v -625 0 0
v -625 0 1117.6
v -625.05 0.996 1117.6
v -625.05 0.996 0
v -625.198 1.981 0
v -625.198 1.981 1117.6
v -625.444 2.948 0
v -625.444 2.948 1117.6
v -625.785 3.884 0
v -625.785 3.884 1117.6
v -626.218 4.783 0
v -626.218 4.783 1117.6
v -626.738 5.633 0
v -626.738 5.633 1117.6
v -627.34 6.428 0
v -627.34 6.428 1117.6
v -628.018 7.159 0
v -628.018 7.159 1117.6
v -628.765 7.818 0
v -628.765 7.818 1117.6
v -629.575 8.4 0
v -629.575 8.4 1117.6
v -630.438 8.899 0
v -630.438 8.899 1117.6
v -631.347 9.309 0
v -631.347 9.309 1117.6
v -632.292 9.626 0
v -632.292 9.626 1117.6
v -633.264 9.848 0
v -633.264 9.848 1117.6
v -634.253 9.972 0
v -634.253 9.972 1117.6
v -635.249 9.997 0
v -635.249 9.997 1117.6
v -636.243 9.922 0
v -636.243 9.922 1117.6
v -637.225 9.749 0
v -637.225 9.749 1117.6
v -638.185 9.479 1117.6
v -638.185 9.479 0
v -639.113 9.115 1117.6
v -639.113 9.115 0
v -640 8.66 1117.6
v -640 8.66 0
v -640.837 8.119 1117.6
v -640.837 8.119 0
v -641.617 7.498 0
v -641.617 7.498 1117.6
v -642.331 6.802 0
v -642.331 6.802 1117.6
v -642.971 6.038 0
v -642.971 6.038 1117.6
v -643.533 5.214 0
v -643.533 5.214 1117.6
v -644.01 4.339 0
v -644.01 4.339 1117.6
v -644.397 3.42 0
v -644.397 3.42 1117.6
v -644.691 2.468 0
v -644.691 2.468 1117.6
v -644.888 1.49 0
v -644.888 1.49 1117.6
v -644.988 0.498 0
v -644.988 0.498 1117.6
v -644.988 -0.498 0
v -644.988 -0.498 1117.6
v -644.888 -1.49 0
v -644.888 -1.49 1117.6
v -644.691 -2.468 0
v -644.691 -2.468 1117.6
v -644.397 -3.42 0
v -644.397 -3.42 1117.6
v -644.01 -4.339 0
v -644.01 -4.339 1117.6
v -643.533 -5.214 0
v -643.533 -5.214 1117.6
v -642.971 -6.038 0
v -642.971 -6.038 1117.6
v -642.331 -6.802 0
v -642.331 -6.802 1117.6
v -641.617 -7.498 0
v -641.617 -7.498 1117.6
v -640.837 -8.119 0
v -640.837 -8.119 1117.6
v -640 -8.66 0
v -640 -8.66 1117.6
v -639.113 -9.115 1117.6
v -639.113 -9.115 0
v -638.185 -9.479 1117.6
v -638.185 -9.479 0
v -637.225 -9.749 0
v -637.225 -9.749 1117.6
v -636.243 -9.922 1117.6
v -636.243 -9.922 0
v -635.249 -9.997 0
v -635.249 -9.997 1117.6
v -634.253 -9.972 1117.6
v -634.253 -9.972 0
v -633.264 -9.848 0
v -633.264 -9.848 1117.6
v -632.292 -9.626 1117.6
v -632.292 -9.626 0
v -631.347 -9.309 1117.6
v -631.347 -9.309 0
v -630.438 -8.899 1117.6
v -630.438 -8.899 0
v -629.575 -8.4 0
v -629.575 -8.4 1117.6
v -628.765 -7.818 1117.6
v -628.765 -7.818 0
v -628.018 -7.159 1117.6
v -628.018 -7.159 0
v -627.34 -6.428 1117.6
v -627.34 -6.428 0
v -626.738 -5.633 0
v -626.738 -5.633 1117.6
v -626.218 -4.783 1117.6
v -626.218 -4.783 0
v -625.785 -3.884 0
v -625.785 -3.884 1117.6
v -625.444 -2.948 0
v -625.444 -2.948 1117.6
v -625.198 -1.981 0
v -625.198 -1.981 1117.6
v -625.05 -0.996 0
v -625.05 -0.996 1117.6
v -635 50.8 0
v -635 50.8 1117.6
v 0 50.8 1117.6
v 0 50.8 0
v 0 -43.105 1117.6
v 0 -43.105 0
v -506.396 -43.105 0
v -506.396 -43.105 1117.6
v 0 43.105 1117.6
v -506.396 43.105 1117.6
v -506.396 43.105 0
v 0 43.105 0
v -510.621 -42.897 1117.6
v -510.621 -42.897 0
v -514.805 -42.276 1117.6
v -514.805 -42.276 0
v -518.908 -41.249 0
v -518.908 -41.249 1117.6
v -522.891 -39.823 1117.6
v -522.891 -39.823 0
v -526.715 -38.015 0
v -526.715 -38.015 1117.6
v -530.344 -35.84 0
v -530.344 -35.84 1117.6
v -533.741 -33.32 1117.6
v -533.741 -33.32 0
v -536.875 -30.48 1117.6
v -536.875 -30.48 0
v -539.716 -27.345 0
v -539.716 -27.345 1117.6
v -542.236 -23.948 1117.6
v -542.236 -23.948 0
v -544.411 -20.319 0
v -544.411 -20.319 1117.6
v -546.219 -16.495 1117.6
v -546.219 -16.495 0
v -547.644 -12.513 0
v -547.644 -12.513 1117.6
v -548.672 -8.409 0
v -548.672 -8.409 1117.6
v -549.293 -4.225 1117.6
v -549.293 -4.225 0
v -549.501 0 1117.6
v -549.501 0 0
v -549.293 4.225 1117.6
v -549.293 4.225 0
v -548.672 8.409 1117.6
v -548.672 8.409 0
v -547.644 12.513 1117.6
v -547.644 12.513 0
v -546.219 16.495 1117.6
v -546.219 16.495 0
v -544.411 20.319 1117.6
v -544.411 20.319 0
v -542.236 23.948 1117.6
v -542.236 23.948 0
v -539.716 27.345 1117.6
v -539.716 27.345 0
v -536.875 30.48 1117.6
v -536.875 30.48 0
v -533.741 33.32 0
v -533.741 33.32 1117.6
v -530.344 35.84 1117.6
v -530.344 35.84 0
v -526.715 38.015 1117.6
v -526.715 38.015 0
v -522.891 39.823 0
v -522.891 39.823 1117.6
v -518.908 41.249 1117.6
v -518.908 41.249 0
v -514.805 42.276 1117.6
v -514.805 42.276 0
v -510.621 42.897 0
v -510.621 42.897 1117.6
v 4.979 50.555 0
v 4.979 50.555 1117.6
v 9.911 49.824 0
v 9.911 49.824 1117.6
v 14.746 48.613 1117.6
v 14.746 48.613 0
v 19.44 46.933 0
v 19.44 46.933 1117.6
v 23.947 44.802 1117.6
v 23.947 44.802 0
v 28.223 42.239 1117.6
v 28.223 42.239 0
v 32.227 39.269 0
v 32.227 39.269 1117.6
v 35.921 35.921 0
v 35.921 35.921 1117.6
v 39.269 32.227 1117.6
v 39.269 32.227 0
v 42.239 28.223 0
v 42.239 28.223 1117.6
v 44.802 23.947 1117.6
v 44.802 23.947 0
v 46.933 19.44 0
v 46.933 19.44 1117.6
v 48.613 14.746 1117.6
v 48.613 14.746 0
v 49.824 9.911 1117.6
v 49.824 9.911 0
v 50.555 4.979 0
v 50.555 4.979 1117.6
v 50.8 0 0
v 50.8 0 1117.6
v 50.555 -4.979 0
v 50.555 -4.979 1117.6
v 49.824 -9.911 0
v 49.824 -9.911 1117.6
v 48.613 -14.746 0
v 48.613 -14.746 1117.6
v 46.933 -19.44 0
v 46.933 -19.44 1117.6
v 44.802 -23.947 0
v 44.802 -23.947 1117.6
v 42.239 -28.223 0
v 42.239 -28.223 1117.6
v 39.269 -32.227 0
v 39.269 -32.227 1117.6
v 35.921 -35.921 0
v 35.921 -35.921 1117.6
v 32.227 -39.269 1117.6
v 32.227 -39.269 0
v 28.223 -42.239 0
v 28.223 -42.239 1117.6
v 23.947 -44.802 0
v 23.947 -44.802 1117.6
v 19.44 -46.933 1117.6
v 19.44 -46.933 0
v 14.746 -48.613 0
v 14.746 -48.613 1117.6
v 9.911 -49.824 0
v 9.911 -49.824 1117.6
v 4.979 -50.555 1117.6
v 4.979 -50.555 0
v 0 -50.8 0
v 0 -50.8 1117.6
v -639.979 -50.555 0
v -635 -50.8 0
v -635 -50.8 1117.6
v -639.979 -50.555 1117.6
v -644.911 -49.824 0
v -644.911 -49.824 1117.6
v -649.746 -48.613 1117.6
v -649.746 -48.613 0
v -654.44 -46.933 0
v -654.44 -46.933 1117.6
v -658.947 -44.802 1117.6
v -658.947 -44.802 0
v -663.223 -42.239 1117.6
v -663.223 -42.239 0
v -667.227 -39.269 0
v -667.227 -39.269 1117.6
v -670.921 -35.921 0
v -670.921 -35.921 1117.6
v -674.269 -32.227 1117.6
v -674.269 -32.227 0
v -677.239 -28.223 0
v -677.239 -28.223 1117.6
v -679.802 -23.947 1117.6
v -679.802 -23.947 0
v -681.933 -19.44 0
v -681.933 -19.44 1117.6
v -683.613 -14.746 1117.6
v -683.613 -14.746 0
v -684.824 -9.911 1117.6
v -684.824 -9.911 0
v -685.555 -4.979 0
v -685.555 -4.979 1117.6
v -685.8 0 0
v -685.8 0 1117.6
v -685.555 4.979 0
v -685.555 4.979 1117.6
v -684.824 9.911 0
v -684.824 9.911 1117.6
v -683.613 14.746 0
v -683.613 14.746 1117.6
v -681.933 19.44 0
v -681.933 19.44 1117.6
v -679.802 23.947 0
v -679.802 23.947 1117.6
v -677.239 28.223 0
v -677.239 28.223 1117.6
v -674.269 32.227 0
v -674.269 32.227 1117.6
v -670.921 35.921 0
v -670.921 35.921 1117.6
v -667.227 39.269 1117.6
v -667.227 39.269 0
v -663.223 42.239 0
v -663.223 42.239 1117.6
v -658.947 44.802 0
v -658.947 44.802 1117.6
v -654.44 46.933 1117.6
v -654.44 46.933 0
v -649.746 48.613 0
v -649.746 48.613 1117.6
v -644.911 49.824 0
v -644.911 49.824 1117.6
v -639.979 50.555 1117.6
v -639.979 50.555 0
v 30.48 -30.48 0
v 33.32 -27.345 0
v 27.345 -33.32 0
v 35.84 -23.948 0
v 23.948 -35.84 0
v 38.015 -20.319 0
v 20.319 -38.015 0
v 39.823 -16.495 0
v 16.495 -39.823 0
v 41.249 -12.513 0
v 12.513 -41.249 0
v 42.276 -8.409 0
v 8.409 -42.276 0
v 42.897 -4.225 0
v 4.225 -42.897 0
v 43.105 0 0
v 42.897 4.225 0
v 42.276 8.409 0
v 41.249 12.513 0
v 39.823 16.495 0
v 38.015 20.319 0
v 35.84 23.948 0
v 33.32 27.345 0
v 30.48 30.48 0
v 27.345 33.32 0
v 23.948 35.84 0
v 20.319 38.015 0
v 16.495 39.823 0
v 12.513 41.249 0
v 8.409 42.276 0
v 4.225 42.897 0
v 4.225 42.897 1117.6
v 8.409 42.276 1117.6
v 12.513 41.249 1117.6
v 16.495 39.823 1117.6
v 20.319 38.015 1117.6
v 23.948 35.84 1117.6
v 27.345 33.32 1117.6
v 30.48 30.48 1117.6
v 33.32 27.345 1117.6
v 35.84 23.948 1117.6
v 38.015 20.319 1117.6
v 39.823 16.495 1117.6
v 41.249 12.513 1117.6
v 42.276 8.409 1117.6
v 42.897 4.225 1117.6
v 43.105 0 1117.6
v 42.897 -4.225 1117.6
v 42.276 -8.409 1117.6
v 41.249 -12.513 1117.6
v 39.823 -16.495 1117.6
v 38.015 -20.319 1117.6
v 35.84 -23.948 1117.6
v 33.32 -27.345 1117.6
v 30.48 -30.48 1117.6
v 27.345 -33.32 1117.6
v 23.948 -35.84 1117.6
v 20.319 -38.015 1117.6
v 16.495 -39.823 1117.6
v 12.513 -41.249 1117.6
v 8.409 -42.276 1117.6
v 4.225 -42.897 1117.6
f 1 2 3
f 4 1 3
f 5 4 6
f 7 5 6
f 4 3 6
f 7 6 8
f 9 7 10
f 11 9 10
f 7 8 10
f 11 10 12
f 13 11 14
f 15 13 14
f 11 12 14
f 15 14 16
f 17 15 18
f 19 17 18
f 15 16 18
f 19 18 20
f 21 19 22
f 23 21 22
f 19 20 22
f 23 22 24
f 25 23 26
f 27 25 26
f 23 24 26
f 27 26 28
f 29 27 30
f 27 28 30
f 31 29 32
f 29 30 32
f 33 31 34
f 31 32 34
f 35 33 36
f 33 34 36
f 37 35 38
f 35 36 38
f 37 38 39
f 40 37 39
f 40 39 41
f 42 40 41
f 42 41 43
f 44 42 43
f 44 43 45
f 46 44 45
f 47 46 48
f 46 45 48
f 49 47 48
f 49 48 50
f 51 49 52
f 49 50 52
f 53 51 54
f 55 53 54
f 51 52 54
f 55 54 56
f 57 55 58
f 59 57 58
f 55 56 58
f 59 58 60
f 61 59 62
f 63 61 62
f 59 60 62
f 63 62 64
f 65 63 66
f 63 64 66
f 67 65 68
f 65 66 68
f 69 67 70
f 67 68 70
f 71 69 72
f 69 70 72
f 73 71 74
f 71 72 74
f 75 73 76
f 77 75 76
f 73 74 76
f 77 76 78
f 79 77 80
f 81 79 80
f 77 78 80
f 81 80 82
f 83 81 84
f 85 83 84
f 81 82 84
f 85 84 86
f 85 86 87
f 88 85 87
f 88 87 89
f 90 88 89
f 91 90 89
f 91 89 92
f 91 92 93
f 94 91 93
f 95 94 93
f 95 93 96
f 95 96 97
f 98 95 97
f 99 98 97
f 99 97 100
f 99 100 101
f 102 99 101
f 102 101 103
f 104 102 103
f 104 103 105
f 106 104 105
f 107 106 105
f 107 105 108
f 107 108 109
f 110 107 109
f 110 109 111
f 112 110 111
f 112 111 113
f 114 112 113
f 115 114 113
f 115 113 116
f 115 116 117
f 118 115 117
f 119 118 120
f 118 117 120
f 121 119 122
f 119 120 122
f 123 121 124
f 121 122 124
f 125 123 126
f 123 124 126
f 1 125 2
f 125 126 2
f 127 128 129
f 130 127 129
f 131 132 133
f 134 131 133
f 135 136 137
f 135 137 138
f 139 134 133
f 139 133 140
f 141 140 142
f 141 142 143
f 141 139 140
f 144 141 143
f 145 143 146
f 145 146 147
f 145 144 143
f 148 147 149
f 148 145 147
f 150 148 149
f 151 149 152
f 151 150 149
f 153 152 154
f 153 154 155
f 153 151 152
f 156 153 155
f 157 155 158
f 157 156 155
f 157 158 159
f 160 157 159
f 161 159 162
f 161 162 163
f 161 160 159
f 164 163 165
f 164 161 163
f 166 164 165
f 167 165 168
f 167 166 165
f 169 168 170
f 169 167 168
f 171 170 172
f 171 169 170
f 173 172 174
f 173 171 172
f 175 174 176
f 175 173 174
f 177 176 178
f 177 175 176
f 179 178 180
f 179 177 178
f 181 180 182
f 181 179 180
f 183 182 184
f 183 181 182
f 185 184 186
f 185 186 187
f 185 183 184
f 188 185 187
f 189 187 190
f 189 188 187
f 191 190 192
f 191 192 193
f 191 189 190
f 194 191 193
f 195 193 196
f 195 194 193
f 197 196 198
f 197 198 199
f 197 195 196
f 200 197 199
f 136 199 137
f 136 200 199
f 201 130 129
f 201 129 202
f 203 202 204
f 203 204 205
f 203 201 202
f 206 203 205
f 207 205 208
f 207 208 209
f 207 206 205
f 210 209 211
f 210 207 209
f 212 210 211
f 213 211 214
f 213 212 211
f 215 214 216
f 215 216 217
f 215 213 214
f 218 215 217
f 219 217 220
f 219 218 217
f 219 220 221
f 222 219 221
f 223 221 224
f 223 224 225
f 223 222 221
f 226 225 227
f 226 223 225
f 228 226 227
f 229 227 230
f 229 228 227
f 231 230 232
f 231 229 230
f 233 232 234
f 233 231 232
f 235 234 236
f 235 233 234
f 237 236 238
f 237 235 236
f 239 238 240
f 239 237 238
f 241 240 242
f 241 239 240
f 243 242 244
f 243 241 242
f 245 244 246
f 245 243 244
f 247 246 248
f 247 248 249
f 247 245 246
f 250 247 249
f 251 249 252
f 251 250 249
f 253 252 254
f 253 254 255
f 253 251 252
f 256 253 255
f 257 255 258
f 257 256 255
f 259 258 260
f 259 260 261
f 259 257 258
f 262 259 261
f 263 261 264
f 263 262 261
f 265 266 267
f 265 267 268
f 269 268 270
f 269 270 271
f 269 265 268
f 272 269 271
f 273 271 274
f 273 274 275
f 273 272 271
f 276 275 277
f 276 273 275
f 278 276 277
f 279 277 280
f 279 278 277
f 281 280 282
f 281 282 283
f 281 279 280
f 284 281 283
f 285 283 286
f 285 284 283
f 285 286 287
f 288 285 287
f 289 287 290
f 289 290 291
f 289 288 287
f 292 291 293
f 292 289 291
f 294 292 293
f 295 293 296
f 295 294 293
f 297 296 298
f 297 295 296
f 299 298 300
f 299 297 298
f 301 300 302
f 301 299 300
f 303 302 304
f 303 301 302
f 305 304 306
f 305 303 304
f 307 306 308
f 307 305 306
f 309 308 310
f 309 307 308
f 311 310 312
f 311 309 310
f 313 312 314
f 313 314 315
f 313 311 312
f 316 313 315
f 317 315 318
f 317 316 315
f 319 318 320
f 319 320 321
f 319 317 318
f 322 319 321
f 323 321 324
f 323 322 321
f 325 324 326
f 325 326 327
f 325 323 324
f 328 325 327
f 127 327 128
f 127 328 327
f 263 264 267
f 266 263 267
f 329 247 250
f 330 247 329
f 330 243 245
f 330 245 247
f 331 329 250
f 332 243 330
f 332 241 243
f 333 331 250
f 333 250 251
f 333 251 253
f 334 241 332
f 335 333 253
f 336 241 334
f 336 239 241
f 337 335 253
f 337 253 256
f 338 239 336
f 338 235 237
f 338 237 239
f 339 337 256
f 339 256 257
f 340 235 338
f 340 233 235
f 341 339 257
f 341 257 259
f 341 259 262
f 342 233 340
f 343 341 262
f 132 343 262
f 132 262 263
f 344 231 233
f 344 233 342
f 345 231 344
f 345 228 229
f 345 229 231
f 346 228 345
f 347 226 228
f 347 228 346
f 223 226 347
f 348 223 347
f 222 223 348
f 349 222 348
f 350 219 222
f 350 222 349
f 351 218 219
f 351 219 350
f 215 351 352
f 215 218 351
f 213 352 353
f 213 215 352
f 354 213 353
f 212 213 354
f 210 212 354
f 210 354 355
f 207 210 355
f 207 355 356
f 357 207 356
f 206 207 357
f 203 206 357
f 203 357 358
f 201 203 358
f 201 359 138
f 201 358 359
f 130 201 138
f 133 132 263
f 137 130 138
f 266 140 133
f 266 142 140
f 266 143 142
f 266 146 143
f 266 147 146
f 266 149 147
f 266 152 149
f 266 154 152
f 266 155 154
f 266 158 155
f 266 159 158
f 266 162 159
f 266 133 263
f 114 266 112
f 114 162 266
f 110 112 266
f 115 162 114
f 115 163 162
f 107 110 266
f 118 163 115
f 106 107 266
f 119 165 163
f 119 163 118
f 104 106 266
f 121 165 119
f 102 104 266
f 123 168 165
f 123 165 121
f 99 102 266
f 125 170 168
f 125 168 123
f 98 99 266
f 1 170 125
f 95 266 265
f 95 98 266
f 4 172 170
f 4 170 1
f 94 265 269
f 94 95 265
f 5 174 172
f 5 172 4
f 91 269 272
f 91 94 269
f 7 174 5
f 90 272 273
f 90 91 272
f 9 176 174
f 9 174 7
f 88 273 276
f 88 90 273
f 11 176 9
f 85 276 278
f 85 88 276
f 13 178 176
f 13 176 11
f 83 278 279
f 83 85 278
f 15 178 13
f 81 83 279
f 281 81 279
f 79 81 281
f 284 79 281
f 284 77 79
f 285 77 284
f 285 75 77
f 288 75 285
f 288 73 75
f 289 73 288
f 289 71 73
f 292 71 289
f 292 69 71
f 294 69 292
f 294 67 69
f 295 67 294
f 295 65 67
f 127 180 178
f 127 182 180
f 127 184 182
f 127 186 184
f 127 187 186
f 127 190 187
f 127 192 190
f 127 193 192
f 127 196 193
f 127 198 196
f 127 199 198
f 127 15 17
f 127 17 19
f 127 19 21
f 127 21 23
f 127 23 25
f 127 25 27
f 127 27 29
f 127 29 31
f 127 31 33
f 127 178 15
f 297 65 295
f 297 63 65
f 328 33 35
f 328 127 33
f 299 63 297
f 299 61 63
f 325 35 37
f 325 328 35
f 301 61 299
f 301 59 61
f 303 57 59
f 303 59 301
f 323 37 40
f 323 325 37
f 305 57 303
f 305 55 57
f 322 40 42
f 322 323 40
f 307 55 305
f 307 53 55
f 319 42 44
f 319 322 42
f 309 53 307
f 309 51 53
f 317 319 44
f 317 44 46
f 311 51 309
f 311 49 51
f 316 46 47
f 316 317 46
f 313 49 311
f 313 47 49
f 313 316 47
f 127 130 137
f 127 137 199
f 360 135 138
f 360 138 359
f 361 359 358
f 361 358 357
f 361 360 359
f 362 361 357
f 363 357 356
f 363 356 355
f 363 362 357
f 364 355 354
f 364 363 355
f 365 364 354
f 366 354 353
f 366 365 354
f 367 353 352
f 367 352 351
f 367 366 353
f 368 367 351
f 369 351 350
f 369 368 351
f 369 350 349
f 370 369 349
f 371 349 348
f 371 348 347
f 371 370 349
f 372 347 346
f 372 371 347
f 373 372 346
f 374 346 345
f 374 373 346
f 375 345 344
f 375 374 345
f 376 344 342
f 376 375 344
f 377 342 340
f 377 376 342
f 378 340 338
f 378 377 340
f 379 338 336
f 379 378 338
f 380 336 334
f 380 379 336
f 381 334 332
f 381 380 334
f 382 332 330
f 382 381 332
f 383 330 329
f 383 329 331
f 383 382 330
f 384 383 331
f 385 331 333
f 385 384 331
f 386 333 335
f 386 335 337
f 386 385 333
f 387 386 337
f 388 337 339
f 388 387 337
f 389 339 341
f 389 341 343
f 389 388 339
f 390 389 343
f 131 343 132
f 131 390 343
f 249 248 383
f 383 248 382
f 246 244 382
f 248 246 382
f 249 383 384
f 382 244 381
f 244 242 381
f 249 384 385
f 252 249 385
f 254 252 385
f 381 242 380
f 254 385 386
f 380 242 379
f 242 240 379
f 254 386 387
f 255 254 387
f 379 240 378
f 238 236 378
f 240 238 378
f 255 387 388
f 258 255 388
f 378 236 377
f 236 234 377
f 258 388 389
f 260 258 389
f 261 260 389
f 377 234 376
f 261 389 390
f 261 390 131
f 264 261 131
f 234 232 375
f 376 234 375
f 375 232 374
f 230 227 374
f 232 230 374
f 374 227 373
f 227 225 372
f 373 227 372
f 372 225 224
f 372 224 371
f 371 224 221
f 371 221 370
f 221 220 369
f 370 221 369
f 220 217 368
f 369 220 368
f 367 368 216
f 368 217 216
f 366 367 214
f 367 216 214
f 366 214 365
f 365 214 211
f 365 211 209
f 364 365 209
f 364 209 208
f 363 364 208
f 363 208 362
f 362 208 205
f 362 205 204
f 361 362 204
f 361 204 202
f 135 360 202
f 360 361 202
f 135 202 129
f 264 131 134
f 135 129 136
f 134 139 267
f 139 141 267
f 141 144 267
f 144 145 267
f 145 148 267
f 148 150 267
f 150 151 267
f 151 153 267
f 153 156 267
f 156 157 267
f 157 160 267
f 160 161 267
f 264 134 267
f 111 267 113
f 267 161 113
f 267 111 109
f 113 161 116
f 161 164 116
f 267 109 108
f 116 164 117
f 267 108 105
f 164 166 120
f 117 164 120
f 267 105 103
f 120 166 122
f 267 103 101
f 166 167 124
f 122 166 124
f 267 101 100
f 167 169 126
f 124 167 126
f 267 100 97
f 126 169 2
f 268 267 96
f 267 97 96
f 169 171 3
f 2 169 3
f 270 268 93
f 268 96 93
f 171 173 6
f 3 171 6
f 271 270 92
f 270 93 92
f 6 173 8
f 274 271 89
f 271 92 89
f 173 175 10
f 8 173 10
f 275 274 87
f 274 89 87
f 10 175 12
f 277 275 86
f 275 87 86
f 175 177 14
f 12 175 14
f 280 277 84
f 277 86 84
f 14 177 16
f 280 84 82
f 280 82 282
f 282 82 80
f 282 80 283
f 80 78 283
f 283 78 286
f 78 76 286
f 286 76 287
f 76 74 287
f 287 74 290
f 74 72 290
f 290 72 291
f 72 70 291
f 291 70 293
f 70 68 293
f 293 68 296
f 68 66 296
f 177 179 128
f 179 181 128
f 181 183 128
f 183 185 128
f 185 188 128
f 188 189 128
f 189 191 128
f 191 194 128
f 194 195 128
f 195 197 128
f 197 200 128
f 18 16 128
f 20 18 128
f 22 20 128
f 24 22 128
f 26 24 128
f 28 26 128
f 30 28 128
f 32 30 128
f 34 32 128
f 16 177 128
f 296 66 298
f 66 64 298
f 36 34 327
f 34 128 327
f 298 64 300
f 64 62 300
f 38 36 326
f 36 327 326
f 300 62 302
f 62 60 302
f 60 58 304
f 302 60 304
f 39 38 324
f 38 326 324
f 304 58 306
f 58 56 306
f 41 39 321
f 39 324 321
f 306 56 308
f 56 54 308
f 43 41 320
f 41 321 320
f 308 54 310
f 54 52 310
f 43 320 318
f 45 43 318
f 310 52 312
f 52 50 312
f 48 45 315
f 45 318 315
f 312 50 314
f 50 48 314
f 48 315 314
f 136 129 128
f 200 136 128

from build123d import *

# Parameters (mm, degrees)
BOSS_EXTRUDE2_DEPTH = 1117.6
SKETCH3_R           = 10
CUT_EXTRUDE1_DEPTH  = 1117.6


with BuildPart() as part:
    # Sketch2 → Boss-Extrude2 (new body)
    with BuildSketch(Plane.XY):
        with BuildLine():
            Line((0, -50.8), (-635, -50.8))
            ThreePointArc((-635, -50.8), (-685.8, 0), (-635, 50.8))
            Line((-635, 50.8), (0, 50.8))
            ThreePointArc((0, 50.8), (50.8, 0), (0, -50.8))
        make_face()
    extrude(amount=BOSS_EXTRUDE2_DEPTH)

    # Sketch3 → Cut-Extrude1 (cut)
    with BuildSketch(Plane.XY.offset(1117.6)):
        with Locations((-635, 0)):
            Circle(SKETCH3_R)
        with BuildLine():
            Line((0, -43.104643513), (-506.395864425, -43.104643513))
            ThreePointArc((-506.395864425, -43.104643513), (-549.500507938, 0), (-506.395864425, 43.104643513))
            Line((-506.395864425, 43.104643513), (0, 43.104643513))
            ThreePointArc((0, 43.104643513), (43.104643513, 0), (0, -43.104643513))
        make_face()
    extrude(amount=-CUT_EXTRUDE1_DEPTH, mode=Mode.SUBTRACT)


solid = part.part
